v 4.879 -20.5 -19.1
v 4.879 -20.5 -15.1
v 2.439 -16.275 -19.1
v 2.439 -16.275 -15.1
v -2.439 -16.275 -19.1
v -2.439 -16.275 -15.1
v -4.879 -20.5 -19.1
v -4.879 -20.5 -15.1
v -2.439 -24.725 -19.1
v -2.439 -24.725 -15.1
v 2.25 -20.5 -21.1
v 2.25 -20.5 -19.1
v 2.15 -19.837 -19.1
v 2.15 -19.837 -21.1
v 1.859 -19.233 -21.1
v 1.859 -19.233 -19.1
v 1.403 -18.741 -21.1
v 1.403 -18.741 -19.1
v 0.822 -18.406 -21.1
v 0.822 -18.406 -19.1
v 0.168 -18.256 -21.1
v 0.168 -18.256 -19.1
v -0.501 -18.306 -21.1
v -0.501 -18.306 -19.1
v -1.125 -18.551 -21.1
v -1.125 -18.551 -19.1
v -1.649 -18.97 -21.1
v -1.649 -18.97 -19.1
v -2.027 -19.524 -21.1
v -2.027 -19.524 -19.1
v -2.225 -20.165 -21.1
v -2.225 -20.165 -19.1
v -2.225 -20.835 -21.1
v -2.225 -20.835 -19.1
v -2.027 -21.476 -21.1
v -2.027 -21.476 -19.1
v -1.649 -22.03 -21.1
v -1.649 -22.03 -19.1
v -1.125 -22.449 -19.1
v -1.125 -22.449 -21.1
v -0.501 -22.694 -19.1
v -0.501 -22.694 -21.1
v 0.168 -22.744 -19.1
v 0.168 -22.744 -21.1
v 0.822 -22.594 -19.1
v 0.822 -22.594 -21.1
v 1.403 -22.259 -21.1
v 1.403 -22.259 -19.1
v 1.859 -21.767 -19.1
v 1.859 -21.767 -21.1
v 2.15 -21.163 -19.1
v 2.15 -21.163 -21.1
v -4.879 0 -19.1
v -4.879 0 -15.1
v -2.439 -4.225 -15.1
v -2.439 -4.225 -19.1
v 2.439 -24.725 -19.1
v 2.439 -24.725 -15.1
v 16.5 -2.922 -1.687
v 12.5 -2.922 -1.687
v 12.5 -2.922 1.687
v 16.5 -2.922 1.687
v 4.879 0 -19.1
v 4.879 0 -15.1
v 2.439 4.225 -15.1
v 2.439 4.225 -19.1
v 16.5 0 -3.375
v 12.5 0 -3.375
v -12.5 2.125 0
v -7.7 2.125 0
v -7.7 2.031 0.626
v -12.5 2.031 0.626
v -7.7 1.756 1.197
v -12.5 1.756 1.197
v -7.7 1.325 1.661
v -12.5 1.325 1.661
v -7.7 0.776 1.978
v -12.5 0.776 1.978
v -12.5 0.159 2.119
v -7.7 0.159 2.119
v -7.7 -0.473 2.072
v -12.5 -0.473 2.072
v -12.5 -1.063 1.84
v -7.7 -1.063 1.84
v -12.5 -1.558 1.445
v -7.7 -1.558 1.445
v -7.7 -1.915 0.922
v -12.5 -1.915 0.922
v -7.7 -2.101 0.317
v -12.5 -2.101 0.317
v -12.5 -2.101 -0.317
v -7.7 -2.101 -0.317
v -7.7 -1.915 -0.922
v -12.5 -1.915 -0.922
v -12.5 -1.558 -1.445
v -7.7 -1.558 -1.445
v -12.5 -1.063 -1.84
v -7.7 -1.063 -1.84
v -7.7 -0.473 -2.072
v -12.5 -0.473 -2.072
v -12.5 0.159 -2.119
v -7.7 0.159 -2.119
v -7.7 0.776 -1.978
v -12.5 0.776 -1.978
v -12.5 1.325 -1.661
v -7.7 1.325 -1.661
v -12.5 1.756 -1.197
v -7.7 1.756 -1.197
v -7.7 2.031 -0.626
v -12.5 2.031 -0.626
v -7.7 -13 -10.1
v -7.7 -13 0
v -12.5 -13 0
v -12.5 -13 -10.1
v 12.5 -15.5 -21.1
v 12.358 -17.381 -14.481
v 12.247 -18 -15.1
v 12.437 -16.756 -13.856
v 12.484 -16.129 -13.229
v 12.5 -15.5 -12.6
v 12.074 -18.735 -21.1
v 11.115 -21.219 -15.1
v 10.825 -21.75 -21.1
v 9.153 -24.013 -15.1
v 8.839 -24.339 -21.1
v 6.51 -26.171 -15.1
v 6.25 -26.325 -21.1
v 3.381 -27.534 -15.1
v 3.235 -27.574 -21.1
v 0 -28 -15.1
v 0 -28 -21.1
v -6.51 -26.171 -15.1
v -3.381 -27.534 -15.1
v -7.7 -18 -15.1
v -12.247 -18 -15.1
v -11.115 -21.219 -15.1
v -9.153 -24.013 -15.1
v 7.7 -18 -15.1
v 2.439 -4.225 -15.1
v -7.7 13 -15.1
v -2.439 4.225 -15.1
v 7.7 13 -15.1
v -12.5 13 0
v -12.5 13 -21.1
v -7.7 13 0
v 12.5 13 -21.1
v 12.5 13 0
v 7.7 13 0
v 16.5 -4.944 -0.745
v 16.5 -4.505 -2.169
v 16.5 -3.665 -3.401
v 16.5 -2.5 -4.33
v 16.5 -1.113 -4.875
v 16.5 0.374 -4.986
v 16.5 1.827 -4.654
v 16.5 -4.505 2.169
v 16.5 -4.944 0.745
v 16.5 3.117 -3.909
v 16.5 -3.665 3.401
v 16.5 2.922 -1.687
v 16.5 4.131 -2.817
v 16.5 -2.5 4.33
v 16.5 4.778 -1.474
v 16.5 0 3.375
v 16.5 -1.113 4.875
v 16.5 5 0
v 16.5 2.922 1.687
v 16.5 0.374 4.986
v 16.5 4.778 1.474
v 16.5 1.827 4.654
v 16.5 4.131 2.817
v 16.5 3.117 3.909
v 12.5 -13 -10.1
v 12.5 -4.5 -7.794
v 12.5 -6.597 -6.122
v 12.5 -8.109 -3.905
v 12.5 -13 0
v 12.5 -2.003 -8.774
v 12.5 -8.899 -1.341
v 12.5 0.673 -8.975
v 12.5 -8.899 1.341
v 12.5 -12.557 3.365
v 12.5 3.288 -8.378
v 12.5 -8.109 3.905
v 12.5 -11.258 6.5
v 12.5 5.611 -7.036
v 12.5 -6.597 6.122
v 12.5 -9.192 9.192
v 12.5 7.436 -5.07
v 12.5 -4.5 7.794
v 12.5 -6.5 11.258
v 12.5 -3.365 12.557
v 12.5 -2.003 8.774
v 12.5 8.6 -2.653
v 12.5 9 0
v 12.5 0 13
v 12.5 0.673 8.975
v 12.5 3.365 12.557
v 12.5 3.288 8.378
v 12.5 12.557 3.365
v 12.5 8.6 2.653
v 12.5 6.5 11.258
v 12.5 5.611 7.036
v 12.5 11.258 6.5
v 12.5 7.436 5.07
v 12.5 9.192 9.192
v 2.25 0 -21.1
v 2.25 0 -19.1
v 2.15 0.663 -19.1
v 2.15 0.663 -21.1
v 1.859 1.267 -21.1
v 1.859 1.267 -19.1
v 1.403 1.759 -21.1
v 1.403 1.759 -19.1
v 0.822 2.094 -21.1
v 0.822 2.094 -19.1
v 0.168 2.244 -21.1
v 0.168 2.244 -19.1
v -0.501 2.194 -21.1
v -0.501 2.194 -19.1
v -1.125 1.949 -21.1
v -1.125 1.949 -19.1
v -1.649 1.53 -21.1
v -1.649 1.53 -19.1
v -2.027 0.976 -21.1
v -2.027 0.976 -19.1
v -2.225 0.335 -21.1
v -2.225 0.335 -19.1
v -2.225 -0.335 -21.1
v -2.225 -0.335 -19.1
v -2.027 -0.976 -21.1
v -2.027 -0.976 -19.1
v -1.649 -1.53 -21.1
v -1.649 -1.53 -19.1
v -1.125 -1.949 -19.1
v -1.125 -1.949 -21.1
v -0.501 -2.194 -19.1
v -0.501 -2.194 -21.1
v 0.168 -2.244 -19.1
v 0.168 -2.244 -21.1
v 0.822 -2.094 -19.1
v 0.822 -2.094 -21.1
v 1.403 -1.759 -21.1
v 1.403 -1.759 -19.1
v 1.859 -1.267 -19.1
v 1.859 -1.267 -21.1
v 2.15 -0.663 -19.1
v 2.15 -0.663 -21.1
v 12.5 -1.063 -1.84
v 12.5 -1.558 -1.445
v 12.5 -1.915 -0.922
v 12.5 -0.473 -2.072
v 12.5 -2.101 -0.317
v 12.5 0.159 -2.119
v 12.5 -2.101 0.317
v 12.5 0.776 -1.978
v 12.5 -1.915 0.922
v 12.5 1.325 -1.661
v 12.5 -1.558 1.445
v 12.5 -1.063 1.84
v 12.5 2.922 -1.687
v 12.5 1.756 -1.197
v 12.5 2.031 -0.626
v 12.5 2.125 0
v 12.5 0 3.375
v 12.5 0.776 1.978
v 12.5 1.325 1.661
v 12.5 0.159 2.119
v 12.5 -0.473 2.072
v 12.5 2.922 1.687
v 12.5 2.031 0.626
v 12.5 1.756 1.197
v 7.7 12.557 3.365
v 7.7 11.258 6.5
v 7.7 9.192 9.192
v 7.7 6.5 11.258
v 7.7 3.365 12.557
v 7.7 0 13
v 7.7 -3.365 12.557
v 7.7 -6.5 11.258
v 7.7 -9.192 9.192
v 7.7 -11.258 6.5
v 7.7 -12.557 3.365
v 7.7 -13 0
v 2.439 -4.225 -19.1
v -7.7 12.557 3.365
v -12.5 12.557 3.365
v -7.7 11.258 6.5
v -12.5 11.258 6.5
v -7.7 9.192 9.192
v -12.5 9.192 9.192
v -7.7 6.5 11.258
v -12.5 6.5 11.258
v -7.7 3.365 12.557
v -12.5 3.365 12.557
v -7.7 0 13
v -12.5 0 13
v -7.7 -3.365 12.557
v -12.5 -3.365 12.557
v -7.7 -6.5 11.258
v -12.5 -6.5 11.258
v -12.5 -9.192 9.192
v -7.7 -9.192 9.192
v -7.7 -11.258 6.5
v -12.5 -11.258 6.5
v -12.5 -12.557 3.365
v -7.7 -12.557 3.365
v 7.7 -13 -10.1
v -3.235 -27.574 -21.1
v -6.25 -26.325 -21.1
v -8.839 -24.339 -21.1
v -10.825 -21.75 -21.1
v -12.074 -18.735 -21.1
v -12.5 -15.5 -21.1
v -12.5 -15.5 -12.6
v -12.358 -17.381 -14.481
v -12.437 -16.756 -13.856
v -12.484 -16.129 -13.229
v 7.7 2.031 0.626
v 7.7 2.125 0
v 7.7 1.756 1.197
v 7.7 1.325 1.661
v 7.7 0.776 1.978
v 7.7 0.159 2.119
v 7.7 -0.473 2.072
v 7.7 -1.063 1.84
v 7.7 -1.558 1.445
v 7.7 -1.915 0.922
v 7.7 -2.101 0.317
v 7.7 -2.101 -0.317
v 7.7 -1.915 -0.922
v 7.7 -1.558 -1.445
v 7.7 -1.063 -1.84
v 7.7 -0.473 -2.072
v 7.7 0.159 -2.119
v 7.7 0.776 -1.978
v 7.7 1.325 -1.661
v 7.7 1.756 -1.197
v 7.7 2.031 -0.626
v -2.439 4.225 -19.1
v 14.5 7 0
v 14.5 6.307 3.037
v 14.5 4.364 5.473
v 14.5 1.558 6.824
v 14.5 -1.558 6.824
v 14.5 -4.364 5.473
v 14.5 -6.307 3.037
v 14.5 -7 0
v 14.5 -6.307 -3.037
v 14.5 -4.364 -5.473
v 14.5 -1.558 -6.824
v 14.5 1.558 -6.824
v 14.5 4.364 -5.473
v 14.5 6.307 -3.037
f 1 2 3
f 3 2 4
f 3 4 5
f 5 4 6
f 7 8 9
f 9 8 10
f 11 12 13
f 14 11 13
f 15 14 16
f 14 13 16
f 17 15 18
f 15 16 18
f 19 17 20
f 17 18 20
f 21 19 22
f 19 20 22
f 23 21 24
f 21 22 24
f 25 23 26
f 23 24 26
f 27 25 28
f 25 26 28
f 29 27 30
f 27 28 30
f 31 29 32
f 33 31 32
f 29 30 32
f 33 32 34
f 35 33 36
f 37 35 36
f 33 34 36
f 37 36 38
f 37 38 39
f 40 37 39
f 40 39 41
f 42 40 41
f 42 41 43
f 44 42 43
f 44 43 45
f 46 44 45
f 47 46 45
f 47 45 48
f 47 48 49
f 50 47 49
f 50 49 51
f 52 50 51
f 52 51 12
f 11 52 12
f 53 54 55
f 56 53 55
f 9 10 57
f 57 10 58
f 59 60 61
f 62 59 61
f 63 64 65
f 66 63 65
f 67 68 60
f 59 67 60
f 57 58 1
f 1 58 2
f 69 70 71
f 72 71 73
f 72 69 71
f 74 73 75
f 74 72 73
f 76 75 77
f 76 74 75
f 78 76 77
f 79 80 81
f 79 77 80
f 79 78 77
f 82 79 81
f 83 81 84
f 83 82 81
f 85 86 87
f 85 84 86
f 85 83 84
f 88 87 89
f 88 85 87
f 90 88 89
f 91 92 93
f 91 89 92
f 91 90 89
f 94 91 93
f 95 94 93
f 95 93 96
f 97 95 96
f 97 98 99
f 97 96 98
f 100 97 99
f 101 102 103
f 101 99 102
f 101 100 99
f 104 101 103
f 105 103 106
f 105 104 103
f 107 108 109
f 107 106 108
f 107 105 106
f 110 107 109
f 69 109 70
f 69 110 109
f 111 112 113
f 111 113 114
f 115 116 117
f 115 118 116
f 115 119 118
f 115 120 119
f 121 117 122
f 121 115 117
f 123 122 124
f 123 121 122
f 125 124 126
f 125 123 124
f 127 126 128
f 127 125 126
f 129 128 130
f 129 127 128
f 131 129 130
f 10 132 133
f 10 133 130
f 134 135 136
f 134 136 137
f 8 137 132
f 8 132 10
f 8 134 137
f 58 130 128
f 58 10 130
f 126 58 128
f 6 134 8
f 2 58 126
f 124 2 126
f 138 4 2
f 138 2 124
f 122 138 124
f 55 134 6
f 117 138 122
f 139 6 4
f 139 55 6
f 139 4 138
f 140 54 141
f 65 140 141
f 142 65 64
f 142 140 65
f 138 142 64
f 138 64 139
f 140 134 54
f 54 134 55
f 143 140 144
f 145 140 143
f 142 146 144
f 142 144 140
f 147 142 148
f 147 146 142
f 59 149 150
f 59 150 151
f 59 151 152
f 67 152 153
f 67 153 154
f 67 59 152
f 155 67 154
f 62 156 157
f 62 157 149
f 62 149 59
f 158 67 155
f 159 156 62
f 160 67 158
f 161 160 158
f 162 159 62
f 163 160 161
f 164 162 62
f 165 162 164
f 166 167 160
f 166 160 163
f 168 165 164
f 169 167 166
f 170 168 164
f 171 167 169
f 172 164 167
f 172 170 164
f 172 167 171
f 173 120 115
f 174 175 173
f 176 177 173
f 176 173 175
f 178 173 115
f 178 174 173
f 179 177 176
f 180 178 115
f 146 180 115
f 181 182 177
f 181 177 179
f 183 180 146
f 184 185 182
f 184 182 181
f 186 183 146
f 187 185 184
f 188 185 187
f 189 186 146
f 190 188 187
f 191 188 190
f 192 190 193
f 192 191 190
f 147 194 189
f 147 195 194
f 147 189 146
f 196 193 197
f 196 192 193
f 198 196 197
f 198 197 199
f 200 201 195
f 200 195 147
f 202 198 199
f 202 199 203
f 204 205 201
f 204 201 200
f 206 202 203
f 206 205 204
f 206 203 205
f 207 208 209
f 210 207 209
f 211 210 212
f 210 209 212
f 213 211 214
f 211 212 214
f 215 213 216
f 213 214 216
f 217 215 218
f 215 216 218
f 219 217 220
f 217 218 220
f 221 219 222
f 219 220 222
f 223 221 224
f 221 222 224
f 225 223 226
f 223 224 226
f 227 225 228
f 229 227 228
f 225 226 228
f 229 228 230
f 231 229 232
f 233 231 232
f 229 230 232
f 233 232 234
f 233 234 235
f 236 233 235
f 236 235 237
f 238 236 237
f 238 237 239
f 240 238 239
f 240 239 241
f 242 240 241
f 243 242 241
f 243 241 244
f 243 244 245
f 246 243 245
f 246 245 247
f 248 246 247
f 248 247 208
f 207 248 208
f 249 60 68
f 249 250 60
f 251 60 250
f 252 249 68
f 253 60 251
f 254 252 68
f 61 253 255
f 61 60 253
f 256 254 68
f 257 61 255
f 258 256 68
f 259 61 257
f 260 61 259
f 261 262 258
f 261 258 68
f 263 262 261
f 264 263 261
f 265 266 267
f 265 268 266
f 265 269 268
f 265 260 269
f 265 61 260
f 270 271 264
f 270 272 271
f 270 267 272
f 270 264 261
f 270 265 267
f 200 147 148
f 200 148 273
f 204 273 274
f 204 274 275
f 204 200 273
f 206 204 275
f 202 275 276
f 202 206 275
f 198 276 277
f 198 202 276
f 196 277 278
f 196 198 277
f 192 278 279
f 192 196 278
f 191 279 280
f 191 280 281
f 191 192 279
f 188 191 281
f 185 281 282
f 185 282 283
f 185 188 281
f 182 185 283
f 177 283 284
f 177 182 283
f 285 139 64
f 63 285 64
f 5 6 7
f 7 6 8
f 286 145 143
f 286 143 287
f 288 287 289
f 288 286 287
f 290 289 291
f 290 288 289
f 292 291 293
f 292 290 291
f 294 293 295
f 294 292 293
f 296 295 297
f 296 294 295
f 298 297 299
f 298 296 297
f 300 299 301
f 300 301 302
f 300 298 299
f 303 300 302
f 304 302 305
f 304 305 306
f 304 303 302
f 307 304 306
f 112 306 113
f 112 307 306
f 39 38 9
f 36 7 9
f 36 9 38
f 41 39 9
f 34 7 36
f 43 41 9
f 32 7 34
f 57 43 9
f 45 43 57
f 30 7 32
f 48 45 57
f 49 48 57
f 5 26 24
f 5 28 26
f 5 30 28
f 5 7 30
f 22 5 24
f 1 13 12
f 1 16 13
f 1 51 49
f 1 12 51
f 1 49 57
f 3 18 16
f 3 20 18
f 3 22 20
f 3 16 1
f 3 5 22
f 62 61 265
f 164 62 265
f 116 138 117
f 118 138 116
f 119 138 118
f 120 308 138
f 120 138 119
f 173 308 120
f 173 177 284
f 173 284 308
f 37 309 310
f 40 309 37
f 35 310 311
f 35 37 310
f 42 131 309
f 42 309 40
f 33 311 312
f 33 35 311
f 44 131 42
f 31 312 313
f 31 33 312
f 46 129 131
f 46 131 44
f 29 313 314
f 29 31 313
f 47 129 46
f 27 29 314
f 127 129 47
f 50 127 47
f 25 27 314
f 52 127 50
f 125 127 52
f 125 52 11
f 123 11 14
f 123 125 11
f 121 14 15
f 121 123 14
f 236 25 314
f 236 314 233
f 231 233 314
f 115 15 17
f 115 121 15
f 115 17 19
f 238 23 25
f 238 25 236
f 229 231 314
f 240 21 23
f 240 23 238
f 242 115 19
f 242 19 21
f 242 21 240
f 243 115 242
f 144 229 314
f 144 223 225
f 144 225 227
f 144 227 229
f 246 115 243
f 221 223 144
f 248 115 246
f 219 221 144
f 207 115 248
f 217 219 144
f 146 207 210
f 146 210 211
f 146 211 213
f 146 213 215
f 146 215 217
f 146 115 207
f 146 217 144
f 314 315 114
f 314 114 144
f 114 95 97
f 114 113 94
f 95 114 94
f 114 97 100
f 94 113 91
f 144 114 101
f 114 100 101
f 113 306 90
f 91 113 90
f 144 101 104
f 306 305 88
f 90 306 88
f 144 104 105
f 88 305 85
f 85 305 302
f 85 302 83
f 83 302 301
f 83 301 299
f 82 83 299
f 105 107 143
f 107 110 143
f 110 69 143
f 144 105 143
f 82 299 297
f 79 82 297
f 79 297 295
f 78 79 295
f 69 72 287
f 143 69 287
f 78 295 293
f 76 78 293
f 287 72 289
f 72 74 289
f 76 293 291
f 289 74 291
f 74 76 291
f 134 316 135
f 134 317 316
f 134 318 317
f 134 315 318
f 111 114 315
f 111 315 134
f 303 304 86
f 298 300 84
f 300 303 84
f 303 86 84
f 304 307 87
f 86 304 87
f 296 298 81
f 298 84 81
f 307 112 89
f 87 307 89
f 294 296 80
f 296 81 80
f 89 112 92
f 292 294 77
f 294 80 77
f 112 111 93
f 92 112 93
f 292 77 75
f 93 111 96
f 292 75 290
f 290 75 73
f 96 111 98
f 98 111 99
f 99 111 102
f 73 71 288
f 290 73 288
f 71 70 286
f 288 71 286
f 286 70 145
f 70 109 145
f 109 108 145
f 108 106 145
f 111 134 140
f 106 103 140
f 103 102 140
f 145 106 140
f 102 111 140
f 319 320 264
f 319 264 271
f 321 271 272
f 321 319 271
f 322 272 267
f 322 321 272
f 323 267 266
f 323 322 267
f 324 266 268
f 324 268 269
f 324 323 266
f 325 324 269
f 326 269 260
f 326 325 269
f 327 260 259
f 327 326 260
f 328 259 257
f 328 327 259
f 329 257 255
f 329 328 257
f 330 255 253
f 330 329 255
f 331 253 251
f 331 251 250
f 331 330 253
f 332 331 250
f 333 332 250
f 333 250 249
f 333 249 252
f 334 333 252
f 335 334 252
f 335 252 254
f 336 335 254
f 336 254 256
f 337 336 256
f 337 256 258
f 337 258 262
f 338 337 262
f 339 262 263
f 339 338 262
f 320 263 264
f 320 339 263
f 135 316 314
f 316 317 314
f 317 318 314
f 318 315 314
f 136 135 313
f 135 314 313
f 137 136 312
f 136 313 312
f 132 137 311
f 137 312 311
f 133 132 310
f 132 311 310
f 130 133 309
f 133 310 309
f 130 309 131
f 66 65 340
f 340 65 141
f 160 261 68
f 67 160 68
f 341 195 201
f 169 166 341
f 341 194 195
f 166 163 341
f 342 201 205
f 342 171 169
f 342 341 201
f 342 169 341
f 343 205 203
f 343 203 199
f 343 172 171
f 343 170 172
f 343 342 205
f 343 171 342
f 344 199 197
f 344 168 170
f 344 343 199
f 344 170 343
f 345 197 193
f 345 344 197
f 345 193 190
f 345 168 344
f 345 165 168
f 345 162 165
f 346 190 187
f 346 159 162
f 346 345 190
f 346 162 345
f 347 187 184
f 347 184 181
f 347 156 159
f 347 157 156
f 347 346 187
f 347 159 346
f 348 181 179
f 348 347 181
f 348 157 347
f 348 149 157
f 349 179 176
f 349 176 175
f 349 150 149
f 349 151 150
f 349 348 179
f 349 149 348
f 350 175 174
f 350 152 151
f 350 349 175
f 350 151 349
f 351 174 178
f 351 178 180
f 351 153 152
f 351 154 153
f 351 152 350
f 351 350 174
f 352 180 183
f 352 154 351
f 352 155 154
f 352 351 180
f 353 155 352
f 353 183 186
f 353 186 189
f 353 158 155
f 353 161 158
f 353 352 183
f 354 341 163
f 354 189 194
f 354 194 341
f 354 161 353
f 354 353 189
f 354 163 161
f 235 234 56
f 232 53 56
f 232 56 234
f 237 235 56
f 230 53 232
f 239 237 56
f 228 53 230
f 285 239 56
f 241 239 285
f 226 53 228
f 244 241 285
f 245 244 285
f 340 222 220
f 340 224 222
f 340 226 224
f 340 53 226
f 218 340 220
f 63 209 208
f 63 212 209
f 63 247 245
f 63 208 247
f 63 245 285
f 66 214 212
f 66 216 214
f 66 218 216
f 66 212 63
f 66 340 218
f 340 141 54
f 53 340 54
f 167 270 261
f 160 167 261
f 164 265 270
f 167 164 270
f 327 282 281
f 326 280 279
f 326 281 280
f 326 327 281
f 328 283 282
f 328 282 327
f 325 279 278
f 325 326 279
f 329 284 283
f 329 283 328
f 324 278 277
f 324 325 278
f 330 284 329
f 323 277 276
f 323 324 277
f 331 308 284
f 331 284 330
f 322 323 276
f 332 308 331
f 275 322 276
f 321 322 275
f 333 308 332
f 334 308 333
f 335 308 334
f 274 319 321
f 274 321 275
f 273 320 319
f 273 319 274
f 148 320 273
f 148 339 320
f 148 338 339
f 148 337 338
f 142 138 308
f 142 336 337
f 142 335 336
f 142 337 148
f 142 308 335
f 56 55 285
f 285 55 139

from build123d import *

# Parameters (mm, degrees)
F0_R      = 2.125
F1_DEPTH  = 12.5
F2_W      = 15.4
F2_H      = 26
F3_DEPTH  = 28.101
F4_R      = 2.25
F5_DEPTH  = 25
F7_DEPTH  = 4
F8_R      = 12.49999
F9_SIZE   = 5
F10_R     = 5
F11_DEPTH = 4
F12_SIZE  = 3.99999


# Not quite as in the source:
# - a fillet or chamfer is up to 0.001 mm smaller than in the source, because OpenCascade refuses the exact size
# - a feature names something its author has since deleted; it is built from what else it names


with BuildPart() as f1:
    # F0 (on Right) → F1 (new body, symmetric)
    with BuildSketch(Plane.YZ):
        with BuildLine():
            Line((13, -15.1), (13, 0))
            ThreePointArc((13, 0), (0, 13), (-13, 0))
            Line((-13, 0), (-13, -15.1))
            Line((-13, -15.1), (-28, -15.1))
            Line((-28, -15.1), (-28, -21.1))
            Line((-28, -21.1), (0, -21.1))
            Line((0, -21.1), (13, -21.1))
            Line((13, -21.1), (13, -15.1))
        make_face()
        Circle(F0_R, mode=Mode.SUBTRACT)
    extrude(amount=F1_DEPTH, both=True)

    # F2 (on face) → F3 (cut, through all)
    with BuildSketch(Plane.XY.offset(-15.1)):
        Rectangle(F2_W, F2_H)
    extrude(amount=F3_DEPTH, mode=Mode.SUBTRACT)

    # F4 (on face) → F5 (cut)
    with BuildSketch(Plane.XY.offset(-15.1)):
        with Locations((0, -20.5)):
            Circle(F4_R)
        Circle(F4_R)
    extrude(amount=-F5_DEPTH, mode=Mode.SUBTRACT)

    # F6 (on face) → F7 (cut)
    with BuildSketch(Plane.XY.offset(-15.1)):
        Polygon((-4.8786097747, -20.5), (-2.4393048873, -24.725), (2.4393048873, -24.725), (4.8786097747, -20.5), (2.4393048873, -16.275), (-2.4393048873, -16.275), align=None)
        Polygon((2.4393048873, 4.225), (-2.4393048873, 4.225), (-4.8786097747, 0), (-2.4393048873, -4.225), (2.4393048873, -4.225), (4.8786097747, 0), align=None)
    extrude(amount=-F7_DEPTH, mode=Mode.SUBTRACT)

    # F8 (radius 12.5 in the source; OpenCascade refuses exactly that, so slightly less here)
    f8_edges = [f1.edges().sort_by_distance(p)[0] for p in [
        (-12.5, -28, -18.1),
        (12.5, -28, -18.1),
    ]]
    fillet(f8_edges, radius=F8_R)

    # F9
    f9_edges = [f1.edges().sort_by_distance(p)[0] for p in [
        (-10.1, -13, -15.1),
        (10.1, -13, -15.1),
        (10.1, 13, 0),
        (-10.1, 13, 0),
    ]]
    chamfer(f9_edges, length=F9_SIZE)

    # F10 (on face) → F11 (join)
    with BuildSketch(Plane.YZ.offset(12.5)):
        Circle(F10_R)
        Polygon((0, 3.3746123234), (2.9225, 1.6873061617), (2.9225, -1.6873061617), (0, -3.3746123234), (-2.9225, -1.6873061617), (-2.9225, 1.6873061617), align=None, mode=Mode.SUBTRACT)
    extrude(amount=F11_DEPTH)

    # F12 (size 4 in the source; OpenCascade refuses exactly that, so slightly less here)
    f12_edges = [f1.edges().sort_by_distance(p)[0] for p in [
        (12.5, -5, 0),
    ]]
    chamfer(f12_edges, length=F12_SIZE)


solid = f1.part
